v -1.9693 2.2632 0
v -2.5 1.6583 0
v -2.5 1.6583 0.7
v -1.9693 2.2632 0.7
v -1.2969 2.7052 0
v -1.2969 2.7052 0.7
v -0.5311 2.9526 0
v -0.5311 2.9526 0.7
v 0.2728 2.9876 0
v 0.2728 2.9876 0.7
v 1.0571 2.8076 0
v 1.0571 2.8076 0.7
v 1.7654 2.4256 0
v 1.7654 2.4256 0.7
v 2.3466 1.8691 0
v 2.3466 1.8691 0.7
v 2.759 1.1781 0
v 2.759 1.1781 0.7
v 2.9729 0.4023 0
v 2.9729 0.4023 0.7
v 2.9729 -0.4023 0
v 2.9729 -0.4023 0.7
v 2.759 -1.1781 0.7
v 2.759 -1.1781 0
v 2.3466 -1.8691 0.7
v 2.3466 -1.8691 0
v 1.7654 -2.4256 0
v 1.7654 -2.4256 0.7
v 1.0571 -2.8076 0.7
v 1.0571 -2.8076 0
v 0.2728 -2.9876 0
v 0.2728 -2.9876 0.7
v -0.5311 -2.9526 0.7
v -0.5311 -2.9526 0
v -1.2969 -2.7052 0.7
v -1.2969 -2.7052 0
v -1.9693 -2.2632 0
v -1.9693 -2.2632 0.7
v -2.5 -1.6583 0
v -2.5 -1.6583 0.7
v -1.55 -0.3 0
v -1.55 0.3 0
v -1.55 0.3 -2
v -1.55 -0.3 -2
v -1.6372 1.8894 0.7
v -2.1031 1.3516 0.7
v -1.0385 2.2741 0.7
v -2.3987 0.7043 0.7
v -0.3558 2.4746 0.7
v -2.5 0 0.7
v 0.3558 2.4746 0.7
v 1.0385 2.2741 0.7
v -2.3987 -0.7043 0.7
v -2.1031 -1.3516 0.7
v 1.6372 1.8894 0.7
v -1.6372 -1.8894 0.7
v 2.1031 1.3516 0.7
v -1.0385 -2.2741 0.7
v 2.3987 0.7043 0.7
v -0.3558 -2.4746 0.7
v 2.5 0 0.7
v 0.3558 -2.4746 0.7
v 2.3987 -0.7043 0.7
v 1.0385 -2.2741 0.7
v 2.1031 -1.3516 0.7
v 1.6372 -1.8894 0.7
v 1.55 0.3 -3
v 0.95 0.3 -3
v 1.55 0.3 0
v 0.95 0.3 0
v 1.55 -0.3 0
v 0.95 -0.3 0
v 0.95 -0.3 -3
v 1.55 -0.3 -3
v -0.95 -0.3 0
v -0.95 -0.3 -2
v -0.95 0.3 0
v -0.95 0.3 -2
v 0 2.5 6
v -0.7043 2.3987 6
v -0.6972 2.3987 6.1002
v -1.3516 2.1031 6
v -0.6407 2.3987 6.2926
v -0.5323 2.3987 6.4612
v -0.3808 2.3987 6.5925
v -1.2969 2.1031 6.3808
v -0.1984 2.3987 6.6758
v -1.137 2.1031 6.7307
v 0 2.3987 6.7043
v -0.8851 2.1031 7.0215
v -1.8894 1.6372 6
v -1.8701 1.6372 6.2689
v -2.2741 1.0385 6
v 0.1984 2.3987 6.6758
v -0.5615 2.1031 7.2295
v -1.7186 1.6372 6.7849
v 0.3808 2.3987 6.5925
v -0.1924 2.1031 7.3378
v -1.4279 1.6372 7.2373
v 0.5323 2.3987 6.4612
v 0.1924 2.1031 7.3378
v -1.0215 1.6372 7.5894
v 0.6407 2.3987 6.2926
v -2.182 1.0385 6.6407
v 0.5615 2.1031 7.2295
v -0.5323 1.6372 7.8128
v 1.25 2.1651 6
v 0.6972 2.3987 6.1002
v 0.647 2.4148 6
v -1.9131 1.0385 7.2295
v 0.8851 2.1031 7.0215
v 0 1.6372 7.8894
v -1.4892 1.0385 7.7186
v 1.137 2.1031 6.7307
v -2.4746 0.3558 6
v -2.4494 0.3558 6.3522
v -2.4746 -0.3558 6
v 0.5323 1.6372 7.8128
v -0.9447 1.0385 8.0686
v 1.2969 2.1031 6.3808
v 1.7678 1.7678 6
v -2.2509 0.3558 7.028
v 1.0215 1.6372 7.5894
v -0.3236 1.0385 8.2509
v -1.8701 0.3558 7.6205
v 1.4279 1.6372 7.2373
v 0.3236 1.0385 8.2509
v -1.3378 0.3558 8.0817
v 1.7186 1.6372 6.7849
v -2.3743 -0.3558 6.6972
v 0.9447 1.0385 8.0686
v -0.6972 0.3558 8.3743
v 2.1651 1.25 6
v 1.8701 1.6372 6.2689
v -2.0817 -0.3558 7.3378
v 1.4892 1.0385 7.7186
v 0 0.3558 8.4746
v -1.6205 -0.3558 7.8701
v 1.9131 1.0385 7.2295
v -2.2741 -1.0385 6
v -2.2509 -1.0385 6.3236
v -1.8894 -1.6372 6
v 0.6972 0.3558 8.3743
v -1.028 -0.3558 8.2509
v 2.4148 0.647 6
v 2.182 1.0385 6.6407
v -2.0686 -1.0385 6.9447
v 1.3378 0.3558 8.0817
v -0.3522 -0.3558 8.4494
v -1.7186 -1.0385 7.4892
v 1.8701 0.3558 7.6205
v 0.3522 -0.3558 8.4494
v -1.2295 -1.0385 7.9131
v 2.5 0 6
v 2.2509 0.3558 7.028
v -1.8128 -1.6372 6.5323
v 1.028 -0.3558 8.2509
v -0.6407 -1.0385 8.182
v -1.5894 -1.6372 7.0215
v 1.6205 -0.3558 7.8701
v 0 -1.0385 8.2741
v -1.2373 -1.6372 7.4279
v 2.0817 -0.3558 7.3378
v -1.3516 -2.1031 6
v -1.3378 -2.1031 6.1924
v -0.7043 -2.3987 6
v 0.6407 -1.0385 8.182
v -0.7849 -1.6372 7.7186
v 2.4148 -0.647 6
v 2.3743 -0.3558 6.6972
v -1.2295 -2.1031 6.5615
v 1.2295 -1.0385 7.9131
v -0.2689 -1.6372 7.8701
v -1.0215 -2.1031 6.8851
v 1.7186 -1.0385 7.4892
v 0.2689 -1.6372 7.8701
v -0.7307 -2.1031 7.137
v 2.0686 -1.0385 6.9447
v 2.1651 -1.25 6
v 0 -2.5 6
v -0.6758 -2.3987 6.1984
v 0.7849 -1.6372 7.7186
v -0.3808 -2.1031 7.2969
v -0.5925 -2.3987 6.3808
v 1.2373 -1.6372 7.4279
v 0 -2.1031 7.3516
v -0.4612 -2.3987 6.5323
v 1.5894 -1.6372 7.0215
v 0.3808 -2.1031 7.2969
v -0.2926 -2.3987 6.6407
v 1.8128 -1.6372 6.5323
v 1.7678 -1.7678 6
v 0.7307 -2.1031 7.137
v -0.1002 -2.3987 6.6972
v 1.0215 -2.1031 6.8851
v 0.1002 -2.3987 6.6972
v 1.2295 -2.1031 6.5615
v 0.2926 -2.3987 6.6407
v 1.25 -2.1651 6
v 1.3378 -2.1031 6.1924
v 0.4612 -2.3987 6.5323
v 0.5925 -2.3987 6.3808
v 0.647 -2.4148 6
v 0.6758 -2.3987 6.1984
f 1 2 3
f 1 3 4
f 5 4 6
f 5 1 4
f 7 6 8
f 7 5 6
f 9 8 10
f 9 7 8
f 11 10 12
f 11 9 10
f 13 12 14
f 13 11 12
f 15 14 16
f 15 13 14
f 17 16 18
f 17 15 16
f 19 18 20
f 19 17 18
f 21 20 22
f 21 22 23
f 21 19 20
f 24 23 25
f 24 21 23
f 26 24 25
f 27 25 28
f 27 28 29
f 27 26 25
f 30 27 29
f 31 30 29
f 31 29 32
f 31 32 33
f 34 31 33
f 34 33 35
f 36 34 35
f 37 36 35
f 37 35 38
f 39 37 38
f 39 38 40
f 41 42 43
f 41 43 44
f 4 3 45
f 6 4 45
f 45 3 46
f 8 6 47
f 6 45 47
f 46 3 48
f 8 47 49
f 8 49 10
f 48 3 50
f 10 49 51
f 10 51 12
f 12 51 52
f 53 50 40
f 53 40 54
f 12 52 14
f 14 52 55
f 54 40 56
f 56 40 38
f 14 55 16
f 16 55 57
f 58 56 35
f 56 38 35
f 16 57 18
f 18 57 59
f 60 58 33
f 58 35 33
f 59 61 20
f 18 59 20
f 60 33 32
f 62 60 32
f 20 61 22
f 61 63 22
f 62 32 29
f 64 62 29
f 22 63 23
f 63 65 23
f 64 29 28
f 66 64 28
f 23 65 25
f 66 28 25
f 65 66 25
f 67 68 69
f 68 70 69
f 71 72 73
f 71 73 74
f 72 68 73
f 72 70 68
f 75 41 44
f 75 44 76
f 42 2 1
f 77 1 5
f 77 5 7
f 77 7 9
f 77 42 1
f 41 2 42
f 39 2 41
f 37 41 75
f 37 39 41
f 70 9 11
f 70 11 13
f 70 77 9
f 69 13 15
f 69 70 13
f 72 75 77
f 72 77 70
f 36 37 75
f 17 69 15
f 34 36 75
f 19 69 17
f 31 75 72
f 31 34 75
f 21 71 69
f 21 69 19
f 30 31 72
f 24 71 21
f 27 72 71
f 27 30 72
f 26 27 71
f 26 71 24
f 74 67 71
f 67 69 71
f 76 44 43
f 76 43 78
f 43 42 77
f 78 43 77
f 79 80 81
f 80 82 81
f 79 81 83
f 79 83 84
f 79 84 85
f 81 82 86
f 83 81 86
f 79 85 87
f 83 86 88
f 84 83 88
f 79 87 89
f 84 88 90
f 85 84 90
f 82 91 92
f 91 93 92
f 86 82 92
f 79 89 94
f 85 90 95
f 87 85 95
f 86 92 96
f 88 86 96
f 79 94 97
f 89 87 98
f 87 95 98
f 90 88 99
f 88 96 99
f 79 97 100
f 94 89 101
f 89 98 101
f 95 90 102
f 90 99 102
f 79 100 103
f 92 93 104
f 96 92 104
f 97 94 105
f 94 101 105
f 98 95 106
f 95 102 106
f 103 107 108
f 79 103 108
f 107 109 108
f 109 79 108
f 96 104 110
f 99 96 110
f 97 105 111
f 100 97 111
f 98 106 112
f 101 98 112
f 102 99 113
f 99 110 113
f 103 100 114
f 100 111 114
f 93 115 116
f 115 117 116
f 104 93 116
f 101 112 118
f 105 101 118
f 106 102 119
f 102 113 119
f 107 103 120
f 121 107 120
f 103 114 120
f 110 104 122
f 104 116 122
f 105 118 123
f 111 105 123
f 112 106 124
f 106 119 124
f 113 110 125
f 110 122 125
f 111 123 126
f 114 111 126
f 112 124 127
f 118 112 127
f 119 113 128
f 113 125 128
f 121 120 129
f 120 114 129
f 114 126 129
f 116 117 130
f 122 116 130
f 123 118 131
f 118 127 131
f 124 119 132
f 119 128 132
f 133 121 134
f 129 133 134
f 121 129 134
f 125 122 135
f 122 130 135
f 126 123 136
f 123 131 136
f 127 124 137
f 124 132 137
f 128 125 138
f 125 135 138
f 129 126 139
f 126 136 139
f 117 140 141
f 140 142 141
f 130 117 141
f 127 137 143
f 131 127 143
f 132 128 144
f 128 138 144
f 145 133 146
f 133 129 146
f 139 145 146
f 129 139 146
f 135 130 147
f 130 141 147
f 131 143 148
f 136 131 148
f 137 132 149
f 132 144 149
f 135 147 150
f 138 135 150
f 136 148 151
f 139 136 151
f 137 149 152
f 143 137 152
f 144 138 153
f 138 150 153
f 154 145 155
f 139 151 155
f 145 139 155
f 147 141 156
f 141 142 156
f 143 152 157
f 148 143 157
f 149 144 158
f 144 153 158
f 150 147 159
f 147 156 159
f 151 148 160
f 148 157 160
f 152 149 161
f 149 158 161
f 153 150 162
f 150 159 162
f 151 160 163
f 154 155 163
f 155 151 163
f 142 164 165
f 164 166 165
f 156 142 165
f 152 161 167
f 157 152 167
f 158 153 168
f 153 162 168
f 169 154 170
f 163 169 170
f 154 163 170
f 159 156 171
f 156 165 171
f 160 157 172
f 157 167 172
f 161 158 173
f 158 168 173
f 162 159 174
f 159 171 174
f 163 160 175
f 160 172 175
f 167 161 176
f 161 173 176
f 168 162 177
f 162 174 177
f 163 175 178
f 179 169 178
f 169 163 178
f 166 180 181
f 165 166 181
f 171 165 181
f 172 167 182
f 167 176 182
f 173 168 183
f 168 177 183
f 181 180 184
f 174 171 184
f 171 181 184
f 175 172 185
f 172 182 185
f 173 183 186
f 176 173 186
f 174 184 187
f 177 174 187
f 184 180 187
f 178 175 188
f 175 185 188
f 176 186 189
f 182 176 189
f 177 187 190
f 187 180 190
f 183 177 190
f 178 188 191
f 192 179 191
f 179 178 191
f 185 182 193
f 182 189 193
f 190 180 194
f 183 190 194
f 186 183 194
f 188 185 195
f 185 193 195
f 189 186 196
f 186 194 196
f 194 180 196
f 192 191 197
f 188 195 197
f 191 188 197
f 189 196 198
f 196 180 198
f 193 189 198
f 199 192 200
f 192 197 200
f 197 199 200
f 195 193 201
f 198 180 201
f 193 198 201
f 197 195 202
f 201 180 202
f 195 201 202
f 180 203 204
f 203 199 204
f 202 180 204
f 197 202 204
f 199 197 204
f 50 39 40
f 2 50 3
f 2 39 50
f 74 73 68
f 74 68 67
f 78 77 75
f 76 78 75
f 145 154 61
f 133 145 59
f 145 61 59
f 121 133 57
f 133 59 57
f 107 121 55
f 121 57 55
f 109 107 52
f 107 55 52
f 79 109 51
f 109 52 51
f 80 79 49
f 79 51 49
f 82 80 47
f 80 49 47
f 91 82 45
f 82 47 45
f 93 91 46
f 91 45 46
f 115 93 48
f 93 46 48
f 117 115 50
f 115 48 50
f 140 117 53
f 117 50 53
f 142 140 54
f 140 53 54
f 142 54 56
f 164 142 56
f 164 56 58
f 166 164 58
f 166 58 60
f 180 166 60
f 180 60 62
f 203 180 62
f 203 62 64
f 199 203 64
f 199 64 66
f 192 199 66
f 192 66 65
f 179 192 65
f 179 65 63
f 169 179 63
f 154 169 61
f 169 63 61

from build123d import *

# Parameters (mm, degrees)
F0_R      = 2.5
F1_DEPTH  = 6
F5_DEPTH  = 0.7
F6_W      = 0.6
F6_H      = 0.6
F7_DEPTH  = 2
F7_FACE_W = 0.6
F7_FACE_H = 0.6
F8_DEPTH  = 1


with BuildPart() as f1:
    # F0 (on Top) → F1 (new body)
    with BuildSketch(Plane.XY):
        Circle(F0_R)
    extrude(amount=F1_DEPTH)

    # F2 (on face) → F3 (revolve)
    with BuildSketch(Plane.XY.offset(6)):
        with BuildLine():
            ThreePointArc((0, 2.5), (-2.5, 0), (0, -2.5))
            Line((0, -2.5), (0, 2.5))
        make_face()
    revolve(axis=Axis((0, 0, 6), (0, 1, 0)))

    # F4 (on face) → F5 (join)
    with BuildSketch(Plane(origin=(0, 0, 0), x_dir=(1, 0, 0), z_dir=(0, 0, -1))):
        with BuildLine():
            Line((-2.5, 1.658312), (-2.5, -1.658312))
            ThreePointArc((-2.5, -1.658312), (3, 0), (-2.5, 1.658312))
        make_face()
    extrude(amount=-F5_DEPTH)

    # F6 (on face) → F7 (join)
    with BuildSketch(Plane(origin=(0, 0, 0), x_dir=(1, 0, 0), z_dir=(0, 0, -1))):
        with Locations((1.25, 0)):
            Rectangle(F6_W, F6_H)
        with Locations((-1.25, 0)):
            Rectangle(F6_W, F6_H)
    extrude(amount=F7_DEPTH)

    # F7_face (on face) → F8 (join)
    with BuildSketch(Plane(origin=(1.25, 0, -2), x_dir=(1, 0, 0), z_dir=(0, 0, -1))):
        Rectangle(F7_FACE_W, F7_FACE_H)
    extrude(amount=F8_DEPTH)


solid = f1.part
